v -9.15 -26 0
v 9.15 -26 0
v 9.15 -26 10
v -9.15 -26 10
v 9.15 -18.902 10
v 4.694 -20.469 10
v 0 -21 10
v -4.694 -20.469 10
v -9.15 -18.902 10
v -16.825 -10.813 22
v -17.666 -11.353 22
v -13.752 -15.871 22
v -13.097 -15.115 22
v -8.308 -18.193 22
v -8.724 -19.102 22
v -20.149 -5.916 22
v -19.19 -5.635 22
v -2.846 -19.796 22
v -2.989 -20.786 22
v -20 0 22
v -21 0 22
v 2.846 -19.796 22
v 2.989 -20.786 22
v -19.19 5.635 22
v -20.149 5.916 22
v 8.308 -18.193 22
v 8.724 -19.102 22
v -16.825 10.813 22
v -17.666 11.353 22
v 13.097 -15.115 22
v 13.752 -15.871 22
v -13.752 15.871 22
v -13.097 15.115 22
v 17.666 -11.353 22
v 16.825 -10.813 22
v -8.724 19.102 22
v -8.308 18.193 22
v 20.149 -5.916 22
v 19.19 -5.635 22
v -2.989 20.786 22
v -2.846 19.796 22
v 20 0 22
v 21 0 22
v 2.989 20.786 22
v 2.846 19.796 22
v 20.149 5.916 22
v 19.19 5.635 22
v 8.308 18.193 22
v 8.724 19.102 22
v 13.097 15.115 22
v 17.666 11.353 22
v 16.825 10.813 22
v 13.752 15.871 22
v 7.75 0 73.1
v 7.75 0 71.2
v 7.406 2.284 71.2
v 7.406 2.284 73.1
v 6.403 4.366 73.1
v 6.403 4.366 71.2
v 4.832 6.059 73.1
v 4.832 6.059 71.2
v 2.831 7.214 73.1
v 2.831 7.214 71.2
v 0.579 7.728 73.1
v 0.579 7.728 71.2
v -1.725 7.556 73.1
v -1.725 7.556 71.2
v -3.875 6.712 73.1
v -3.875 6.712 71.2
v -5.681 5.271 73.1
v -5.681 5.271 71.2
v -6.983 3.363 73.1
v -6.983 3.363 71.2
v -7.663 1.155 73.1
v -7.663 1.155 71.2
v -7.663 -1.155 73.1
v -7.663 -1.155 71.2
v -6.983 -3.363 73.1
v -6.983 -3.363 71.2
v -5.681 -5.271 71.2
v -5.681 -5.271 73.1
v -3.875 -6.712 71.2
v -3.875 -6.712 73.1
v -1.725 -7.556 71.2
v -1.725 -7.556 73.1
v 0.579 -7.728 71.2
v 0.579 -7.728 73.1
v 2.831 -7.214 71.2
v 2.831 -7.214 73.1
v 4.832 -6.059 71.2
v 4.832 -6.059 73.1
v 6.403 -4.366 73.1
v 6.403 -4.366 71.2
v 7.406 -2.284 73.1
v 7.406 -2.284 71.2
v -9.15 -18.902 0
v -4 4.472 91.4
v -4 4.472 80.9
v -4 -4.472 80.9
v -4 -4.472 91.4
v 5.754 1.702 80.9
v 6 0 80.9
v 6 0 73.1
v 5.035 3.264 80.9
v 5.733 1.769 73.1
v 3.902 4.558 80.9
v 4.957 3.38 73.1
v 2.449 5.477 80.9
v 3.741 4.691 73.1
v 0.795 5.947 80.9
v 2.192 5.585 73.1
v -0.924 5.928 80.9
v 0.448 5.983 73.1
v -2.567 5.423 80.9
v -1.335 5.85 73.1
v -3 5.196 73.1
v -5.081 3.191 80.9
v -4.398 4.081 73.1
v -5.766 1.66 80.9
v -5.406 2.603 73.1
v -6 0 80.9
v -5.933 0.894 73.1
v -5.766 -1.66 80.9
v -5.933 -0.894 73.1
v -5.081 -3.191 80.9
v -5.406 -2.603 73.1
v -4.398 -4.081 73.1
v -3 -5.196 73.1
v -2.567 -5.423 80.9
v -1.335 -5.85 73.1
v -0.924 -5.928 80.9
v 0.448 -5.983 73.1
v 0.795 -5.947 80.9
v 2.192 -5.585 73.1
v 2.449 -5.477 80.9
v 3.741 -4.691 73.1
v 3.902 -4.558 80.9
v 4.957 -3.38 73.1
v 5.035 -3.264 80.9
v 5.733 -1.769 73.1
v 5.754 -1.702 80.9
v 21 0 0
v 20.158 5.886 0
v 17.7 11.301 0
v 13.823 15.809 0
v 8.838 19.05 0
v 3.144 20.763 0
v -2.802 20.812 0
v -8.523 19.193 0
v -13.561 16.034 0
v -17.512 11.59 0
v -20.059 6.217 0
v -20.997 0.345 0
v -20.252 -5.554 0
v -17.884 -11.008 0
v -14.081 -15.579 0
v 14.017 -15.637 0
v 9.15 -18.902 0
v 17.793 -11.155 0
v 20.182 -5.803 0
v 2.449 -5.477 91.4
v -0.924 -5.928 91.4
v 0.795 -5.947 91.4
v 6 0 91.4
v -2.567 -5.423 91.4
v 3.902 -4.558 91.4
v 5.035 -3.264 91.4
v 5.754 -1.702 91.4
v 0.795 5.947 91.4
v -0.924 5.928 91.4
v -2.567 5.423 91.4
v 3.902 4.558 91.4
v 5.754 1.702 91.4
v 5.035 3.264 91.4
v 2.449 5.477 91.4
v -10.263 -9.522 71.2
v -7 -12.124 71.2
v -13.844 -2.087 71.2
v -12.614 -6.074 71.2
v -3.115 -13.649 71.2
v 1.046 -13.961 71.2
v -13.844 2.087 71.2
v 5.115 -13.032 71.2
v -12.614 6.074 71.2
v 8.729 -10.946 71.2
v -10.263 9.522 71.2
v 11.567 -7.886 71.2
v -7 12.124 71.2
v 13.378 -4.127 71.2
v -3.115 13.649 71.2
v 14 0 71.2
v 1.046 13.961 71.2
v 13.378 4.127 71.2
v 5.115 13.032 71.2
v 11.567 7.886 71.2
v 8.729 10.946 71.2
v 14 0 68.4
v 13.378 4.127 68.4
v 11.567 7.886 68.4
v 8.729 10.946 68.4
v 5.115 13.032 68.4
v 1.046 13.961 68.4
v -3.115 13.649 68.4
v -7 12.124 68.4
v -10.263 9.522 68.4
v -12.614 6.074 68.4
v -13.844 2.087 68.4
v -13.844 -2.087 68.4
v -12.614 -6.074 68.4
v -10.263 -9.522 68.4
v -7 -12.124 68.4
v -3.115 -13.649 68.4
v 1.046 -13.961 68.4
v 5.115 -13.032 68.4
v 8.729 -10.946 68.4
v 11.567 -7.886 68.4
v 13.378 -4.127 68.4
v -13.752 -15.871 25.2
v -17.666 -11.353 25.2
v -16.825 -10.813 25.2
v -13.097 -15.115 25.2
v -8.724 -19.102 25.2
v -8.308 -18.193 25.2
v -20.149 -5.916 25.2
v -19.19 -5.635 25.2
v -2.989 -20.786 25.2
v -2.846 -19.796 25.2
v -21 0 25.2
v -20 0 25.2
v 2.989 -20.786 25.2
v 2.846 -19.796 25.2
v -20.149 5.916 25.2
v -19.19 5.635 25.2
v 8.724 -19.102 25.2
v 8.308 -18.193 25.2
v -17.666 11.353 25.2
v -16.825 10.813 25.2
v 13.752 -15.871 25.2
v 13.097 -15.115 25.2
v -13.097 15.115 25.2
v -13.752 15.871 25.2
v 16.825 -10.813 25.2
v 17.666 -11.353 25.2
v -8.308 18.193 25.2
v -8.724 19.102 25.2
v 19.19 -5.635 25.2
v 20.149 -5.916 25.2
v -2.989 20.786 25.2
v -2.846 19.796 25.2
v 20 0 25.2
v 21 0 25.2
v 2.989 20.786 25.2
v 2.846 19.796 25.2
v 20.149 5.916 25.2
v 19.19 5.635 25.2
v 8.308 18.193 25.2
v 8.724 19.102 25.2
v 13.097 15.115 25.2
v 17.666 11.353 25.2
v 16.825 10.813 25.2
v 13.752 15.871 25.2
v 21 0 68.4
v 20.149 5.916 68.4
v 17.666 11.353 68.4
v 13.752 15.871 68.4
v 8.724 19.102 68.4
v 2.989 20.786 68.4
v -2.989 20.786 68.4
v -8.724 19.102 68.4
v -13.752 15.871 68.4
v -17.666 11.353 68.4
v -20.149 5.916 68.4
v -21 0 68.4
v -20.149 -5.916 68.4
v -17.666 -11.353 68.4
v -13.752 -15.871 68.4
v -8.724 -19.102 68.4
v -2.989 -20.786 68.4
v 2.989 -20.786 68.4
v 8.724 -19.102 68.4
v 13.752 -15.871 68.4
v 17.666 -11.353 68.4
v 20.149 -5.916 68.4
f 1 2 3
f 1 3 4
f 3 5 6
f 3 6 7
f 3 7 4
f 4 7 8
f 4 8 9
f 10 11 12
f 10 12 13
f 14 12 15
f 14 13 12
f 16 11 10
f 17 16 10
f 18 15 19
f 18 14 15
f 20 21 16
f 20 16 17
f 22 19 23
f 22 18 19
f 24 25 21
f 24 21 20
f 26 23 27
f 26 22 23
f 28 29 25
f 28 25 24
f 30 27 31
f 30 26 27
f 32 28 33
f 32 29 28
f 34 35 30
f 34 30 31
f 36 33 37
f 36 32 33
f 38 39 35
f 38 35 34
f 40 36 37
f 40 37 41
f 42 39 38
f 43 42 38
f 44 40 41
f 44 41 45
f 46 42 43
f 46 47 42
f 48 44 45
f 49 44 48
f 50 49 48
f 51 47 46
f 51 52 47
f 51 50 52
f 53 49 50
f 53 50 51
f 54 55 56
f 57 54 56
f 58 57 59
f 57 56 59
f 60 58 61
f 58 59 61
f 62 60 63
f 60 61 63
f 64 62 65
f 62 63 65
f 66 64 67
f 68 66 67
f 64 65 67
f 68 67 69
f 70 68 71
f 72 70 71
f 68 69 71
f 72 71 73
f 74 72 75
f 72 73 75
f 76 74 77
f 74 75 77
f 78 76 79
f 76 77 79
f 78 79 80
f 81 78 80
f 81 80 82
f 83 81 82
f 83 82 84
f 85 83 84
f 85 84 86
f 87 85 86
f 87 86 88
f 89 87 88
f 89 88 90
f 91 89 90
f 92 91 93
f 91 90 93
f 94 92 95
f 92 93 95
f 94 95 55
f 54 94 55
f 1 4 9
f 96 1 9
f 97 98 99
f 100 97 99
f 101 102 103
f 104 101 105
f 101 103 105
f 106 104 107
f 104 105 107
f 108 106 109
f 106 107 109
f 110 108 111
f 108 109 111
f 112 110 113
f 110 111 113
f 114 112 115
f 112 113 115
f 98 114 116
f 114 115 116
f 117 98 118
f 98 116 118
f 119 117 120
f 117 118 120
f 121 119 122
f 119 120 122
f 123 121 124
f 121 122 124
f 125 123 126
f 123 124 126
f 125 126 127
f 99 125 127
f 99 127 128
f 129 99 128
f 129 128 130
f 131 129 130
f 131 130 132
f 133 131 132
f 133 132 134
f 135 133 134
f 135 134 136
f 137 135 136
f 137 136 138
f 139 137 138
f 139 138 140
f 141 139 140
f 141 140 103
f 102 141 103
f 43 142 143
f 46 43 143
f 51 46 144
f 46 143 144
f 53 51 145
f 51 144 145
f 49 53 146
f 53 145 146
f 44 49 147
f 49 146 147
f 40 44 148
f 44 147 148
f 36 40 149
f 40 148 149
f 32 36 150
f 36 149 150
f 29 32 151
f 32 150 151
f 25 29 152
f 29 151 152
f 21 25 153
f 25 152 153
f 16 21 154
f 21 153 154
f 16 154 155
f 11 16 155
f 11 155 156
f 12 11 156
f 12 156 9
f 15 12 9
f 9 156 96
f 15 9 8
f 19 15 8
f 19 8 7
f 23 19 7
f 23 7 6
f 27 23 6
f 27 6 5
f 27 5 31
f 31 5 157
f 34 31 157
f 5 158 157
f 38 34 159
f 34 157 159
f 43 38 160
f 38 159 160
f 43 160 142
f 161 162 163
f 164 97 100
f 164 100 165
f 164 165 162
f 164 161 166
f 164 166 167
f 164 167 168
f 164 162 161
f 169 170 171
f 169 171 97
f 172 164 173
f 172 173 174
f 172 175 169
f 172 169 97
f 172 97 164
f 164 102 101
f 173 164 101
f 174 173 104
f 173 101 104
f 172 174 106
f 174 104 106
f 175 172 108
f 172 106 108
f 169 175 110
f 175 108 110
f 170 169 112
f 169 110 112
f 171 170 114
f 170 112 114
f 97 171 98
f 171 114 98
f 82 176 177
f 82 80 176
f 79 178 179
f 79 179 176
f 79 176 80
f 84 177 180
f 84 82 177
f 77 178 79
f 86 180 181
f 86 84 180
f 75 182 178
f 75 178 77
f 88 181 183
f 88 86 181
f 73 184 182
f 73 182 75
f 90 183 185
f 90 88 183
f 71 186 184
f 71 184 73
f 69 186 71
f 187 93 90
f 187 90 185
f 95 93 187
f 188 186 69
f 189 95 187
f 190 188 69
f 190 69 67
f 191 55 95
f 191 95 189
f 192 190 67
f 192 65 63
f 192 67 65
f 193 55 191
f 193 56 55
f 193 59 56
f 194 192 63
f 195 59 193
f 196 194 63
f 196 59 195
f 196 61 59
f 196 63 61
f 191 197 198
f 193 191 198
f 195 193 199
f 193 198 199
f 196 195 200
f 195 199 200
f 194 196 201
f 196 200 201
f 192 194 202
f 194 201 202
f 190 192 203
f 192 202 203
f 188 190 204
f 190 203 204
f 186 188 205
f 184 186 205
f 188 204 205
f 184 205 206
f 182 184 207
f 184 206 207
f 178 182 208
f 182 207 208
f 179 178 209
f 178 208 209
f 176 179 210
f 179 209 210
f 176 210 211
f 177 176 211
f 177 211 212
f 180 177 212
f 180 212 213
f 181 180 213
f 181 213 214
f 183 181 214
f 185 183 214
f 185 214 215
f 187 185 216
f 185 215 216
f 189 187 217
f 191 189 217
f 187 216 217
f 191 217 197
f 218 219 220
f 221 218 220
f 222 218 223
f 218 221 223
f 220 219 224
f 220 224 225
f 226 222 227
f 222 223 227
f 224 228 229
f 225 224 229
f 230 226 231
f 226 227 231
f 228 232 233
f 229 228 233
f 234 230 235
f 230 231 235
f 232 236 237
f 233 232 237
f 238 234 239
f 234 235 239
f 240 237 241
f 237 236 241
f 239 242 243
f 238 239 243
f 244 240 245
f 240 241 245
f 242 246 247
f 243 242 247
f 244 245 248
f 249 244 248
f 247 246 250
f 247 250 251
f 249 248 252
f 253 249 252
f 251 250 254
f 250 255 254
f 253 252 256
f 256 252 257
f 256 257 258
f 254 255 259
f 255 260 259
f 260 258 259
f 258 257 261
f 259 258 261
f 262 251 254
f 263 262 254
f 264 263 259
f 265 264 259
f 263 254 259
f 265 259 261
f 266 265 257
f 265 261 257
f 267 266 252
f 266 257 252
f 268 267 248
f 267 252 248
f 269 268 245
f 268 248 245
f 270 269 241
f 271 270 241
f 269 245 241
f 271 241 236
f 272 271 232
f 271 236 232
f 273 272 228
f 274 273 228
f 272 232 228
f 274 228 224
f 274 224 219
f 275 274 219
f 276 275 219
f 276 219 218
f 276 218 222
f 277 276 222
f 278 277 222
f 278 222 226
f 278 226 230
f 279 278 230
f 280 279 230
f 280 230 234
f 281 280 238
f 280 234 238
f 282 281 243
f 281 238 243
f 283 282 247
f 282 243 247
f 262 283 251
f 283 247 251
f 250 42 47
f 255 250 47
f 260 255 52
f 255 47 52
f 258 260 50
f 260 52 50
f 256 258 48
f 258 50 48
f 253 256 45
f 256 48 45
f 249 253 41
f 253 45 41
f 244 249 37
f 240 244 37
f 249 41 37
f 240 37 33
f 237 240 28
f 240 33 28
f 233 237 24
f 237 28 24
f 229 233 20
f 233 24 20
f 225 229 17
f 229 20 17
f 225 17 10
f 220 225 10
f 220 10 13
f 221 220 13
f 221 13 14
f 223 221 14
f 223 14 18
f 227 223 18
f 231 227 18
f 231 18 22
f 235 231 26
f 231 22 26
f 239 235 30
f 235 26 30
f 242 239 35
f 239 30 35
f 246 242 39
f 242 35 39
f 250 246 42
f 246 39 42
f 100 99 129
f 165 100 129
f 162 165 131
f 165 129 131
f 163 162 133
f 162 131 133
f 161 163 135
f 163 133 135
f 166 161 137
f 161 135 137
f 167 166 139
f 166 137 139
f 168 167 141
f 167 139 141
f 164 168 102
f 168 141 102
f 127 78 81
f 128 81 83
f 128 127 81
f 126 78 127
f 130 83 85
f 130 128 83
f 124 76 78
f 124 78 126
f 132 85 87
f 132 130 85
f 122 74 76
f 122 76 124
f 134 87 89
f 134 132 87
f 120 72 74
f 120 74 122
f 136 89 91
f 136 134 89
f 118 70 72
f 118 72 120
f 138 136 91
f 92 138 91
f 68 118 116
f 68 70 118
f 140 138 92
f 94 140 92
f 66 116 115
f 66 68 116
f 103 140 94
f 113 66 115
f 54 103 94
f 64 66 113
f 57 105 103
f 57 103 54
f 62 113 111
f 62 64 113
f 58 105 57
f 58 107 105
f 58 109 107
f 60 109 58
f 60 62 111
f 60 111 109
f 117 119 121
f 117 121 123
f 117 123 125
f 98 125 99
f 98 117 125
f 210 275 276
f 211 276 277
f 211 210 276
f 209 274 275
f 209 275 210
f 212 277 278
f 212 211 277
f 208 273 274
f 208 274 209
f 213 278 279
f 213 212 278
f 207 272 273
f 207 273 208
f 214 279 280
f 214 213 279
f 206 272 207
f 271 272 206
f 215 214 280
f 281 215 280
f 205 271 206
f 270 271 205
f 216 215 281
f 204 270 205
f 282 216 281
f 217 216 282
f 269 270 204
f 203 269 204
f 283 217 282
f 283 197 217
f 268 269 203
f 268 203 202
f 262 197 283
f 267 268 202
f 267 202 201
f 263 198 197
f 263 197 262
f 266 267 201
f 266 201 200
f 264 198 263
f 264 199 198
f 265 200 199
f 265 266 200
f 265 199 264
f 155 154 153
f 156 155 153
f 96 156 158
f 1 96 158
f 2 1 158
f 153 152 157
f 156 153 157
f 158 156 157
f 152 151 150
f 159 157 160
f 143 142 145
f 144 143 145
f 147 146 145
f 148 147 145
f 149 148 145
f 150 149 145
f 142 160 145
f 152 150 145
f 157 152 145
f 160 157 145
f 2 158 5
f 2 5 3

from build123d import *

# Parameters (mm, degrees)
ESQUISSE1_R        = 21
BOSS_EXTRU_1_DEPTH = 22
BOSS_EXTRU_2_DEPTH = 10
ESQUISSE3_R        = 20
BOSS_EXTRU_3_DEPTH = 3.2
ESQUISSE4_R        = 21
BOSS_EXTRU_4_DEPTH = 43.2
ESQUISSE5_R        = 14
BOSS_EXTRU_5_DEPTH = 2.8
ESQUISSE6_R        = 7.75
BOSS_EXTRU_6_DEPTH = 1.9
ESQUISSE7_R        = 6
BOSS_EXTRU_7_DEPTH = 7.8
BOSS_EXTRU_8_DEPTH = 10.5


with BuildPart() as part:
    # Esquisse1 → Boss.-Extru.1 (new body)
    with BuildSketch(Plane.XY):
        Circle(ESQUISSE1_R)
    extrude(amount=BOSS_EXTRU_1_DEPTH)

    # Esquisse2 → Boss.-Extru.2 (add)
    with BuildSketch(Plane(origin=(0, 0, 0), x_dir=(-1, 0, 0), z_dir=(0, 0, -1))):
        with BuildLine():
            ThreePointArc((9.15, -18.90178563), (0, -21), (-9.15, -18.90178563))
            Line((-9.15, -18.90178563), (-9.15, -26))
            Line((-9.15, -26), (9.15, -26))
            Line((9.15, -26), (9.15, -18.90178563))
        make_face()
    extrude(amount=-BOSS_EXTRU_2_DEPTH)

    # Esquisse3 → Boss.-Extru.3 (add)
    with BuildSketch(Plane.XY.offset(22)):
        Circle(ESQUISSE3_R)
    extrude(amount=BOSS_EXTRU_3_DEPTH)

    # Esquisse4 → Boss.-Extru.4 (add)
    with BuildSketch(Plane.XY.offset(25.2)):
        Circle(ESQUISSE4_R)
    extrude(amount=BOSS_EXTRU_4_DEPTH)

    # Esquisse5 → Boss.-Extru.5 (add)
    with BuildSketch(Plane.XY.offset(68.4)):
        Circle(ESQUISSE5_R)
    extrude(amount=BOSS_EXTRU_5_DEPTH)

    # Esquisse6 → Boss.-Extru.6 (add)
    with BuildSketch(Plane.XY.offset(71.2)):
        Circle(ESQUISSE6_R)
    extrude(amount=BOSS_EXTRU_6_DEPTH)

    # Esquisse7 → Boss.-Extru.7 (add)
    with BuildSketch(Plane.XY.offset(73.1)):
        Circle(ESQUISSE7_R)
    extrude(amount=BOSS_EXTRU_7_DEPTH)

    # Esquisse8 → Boss.-Extru.8 (add)
    with BuildSketch(Plane.XY.offset(80.9)):
        with BuildLine():
            ThreePointArc((6, 0), (2.449489743, 5.477225575), (-4, 4.472135955))
            Line((-4, 4.472135955), (-4, -4.472135955))
            ThreePointArc((-4, -4.472135955), (2.449489743, -5.477225575), (6, 0))
        make_face()
    extrude(amount=BOSS_EXTRU_8_DEPTH)


solid = part.part
